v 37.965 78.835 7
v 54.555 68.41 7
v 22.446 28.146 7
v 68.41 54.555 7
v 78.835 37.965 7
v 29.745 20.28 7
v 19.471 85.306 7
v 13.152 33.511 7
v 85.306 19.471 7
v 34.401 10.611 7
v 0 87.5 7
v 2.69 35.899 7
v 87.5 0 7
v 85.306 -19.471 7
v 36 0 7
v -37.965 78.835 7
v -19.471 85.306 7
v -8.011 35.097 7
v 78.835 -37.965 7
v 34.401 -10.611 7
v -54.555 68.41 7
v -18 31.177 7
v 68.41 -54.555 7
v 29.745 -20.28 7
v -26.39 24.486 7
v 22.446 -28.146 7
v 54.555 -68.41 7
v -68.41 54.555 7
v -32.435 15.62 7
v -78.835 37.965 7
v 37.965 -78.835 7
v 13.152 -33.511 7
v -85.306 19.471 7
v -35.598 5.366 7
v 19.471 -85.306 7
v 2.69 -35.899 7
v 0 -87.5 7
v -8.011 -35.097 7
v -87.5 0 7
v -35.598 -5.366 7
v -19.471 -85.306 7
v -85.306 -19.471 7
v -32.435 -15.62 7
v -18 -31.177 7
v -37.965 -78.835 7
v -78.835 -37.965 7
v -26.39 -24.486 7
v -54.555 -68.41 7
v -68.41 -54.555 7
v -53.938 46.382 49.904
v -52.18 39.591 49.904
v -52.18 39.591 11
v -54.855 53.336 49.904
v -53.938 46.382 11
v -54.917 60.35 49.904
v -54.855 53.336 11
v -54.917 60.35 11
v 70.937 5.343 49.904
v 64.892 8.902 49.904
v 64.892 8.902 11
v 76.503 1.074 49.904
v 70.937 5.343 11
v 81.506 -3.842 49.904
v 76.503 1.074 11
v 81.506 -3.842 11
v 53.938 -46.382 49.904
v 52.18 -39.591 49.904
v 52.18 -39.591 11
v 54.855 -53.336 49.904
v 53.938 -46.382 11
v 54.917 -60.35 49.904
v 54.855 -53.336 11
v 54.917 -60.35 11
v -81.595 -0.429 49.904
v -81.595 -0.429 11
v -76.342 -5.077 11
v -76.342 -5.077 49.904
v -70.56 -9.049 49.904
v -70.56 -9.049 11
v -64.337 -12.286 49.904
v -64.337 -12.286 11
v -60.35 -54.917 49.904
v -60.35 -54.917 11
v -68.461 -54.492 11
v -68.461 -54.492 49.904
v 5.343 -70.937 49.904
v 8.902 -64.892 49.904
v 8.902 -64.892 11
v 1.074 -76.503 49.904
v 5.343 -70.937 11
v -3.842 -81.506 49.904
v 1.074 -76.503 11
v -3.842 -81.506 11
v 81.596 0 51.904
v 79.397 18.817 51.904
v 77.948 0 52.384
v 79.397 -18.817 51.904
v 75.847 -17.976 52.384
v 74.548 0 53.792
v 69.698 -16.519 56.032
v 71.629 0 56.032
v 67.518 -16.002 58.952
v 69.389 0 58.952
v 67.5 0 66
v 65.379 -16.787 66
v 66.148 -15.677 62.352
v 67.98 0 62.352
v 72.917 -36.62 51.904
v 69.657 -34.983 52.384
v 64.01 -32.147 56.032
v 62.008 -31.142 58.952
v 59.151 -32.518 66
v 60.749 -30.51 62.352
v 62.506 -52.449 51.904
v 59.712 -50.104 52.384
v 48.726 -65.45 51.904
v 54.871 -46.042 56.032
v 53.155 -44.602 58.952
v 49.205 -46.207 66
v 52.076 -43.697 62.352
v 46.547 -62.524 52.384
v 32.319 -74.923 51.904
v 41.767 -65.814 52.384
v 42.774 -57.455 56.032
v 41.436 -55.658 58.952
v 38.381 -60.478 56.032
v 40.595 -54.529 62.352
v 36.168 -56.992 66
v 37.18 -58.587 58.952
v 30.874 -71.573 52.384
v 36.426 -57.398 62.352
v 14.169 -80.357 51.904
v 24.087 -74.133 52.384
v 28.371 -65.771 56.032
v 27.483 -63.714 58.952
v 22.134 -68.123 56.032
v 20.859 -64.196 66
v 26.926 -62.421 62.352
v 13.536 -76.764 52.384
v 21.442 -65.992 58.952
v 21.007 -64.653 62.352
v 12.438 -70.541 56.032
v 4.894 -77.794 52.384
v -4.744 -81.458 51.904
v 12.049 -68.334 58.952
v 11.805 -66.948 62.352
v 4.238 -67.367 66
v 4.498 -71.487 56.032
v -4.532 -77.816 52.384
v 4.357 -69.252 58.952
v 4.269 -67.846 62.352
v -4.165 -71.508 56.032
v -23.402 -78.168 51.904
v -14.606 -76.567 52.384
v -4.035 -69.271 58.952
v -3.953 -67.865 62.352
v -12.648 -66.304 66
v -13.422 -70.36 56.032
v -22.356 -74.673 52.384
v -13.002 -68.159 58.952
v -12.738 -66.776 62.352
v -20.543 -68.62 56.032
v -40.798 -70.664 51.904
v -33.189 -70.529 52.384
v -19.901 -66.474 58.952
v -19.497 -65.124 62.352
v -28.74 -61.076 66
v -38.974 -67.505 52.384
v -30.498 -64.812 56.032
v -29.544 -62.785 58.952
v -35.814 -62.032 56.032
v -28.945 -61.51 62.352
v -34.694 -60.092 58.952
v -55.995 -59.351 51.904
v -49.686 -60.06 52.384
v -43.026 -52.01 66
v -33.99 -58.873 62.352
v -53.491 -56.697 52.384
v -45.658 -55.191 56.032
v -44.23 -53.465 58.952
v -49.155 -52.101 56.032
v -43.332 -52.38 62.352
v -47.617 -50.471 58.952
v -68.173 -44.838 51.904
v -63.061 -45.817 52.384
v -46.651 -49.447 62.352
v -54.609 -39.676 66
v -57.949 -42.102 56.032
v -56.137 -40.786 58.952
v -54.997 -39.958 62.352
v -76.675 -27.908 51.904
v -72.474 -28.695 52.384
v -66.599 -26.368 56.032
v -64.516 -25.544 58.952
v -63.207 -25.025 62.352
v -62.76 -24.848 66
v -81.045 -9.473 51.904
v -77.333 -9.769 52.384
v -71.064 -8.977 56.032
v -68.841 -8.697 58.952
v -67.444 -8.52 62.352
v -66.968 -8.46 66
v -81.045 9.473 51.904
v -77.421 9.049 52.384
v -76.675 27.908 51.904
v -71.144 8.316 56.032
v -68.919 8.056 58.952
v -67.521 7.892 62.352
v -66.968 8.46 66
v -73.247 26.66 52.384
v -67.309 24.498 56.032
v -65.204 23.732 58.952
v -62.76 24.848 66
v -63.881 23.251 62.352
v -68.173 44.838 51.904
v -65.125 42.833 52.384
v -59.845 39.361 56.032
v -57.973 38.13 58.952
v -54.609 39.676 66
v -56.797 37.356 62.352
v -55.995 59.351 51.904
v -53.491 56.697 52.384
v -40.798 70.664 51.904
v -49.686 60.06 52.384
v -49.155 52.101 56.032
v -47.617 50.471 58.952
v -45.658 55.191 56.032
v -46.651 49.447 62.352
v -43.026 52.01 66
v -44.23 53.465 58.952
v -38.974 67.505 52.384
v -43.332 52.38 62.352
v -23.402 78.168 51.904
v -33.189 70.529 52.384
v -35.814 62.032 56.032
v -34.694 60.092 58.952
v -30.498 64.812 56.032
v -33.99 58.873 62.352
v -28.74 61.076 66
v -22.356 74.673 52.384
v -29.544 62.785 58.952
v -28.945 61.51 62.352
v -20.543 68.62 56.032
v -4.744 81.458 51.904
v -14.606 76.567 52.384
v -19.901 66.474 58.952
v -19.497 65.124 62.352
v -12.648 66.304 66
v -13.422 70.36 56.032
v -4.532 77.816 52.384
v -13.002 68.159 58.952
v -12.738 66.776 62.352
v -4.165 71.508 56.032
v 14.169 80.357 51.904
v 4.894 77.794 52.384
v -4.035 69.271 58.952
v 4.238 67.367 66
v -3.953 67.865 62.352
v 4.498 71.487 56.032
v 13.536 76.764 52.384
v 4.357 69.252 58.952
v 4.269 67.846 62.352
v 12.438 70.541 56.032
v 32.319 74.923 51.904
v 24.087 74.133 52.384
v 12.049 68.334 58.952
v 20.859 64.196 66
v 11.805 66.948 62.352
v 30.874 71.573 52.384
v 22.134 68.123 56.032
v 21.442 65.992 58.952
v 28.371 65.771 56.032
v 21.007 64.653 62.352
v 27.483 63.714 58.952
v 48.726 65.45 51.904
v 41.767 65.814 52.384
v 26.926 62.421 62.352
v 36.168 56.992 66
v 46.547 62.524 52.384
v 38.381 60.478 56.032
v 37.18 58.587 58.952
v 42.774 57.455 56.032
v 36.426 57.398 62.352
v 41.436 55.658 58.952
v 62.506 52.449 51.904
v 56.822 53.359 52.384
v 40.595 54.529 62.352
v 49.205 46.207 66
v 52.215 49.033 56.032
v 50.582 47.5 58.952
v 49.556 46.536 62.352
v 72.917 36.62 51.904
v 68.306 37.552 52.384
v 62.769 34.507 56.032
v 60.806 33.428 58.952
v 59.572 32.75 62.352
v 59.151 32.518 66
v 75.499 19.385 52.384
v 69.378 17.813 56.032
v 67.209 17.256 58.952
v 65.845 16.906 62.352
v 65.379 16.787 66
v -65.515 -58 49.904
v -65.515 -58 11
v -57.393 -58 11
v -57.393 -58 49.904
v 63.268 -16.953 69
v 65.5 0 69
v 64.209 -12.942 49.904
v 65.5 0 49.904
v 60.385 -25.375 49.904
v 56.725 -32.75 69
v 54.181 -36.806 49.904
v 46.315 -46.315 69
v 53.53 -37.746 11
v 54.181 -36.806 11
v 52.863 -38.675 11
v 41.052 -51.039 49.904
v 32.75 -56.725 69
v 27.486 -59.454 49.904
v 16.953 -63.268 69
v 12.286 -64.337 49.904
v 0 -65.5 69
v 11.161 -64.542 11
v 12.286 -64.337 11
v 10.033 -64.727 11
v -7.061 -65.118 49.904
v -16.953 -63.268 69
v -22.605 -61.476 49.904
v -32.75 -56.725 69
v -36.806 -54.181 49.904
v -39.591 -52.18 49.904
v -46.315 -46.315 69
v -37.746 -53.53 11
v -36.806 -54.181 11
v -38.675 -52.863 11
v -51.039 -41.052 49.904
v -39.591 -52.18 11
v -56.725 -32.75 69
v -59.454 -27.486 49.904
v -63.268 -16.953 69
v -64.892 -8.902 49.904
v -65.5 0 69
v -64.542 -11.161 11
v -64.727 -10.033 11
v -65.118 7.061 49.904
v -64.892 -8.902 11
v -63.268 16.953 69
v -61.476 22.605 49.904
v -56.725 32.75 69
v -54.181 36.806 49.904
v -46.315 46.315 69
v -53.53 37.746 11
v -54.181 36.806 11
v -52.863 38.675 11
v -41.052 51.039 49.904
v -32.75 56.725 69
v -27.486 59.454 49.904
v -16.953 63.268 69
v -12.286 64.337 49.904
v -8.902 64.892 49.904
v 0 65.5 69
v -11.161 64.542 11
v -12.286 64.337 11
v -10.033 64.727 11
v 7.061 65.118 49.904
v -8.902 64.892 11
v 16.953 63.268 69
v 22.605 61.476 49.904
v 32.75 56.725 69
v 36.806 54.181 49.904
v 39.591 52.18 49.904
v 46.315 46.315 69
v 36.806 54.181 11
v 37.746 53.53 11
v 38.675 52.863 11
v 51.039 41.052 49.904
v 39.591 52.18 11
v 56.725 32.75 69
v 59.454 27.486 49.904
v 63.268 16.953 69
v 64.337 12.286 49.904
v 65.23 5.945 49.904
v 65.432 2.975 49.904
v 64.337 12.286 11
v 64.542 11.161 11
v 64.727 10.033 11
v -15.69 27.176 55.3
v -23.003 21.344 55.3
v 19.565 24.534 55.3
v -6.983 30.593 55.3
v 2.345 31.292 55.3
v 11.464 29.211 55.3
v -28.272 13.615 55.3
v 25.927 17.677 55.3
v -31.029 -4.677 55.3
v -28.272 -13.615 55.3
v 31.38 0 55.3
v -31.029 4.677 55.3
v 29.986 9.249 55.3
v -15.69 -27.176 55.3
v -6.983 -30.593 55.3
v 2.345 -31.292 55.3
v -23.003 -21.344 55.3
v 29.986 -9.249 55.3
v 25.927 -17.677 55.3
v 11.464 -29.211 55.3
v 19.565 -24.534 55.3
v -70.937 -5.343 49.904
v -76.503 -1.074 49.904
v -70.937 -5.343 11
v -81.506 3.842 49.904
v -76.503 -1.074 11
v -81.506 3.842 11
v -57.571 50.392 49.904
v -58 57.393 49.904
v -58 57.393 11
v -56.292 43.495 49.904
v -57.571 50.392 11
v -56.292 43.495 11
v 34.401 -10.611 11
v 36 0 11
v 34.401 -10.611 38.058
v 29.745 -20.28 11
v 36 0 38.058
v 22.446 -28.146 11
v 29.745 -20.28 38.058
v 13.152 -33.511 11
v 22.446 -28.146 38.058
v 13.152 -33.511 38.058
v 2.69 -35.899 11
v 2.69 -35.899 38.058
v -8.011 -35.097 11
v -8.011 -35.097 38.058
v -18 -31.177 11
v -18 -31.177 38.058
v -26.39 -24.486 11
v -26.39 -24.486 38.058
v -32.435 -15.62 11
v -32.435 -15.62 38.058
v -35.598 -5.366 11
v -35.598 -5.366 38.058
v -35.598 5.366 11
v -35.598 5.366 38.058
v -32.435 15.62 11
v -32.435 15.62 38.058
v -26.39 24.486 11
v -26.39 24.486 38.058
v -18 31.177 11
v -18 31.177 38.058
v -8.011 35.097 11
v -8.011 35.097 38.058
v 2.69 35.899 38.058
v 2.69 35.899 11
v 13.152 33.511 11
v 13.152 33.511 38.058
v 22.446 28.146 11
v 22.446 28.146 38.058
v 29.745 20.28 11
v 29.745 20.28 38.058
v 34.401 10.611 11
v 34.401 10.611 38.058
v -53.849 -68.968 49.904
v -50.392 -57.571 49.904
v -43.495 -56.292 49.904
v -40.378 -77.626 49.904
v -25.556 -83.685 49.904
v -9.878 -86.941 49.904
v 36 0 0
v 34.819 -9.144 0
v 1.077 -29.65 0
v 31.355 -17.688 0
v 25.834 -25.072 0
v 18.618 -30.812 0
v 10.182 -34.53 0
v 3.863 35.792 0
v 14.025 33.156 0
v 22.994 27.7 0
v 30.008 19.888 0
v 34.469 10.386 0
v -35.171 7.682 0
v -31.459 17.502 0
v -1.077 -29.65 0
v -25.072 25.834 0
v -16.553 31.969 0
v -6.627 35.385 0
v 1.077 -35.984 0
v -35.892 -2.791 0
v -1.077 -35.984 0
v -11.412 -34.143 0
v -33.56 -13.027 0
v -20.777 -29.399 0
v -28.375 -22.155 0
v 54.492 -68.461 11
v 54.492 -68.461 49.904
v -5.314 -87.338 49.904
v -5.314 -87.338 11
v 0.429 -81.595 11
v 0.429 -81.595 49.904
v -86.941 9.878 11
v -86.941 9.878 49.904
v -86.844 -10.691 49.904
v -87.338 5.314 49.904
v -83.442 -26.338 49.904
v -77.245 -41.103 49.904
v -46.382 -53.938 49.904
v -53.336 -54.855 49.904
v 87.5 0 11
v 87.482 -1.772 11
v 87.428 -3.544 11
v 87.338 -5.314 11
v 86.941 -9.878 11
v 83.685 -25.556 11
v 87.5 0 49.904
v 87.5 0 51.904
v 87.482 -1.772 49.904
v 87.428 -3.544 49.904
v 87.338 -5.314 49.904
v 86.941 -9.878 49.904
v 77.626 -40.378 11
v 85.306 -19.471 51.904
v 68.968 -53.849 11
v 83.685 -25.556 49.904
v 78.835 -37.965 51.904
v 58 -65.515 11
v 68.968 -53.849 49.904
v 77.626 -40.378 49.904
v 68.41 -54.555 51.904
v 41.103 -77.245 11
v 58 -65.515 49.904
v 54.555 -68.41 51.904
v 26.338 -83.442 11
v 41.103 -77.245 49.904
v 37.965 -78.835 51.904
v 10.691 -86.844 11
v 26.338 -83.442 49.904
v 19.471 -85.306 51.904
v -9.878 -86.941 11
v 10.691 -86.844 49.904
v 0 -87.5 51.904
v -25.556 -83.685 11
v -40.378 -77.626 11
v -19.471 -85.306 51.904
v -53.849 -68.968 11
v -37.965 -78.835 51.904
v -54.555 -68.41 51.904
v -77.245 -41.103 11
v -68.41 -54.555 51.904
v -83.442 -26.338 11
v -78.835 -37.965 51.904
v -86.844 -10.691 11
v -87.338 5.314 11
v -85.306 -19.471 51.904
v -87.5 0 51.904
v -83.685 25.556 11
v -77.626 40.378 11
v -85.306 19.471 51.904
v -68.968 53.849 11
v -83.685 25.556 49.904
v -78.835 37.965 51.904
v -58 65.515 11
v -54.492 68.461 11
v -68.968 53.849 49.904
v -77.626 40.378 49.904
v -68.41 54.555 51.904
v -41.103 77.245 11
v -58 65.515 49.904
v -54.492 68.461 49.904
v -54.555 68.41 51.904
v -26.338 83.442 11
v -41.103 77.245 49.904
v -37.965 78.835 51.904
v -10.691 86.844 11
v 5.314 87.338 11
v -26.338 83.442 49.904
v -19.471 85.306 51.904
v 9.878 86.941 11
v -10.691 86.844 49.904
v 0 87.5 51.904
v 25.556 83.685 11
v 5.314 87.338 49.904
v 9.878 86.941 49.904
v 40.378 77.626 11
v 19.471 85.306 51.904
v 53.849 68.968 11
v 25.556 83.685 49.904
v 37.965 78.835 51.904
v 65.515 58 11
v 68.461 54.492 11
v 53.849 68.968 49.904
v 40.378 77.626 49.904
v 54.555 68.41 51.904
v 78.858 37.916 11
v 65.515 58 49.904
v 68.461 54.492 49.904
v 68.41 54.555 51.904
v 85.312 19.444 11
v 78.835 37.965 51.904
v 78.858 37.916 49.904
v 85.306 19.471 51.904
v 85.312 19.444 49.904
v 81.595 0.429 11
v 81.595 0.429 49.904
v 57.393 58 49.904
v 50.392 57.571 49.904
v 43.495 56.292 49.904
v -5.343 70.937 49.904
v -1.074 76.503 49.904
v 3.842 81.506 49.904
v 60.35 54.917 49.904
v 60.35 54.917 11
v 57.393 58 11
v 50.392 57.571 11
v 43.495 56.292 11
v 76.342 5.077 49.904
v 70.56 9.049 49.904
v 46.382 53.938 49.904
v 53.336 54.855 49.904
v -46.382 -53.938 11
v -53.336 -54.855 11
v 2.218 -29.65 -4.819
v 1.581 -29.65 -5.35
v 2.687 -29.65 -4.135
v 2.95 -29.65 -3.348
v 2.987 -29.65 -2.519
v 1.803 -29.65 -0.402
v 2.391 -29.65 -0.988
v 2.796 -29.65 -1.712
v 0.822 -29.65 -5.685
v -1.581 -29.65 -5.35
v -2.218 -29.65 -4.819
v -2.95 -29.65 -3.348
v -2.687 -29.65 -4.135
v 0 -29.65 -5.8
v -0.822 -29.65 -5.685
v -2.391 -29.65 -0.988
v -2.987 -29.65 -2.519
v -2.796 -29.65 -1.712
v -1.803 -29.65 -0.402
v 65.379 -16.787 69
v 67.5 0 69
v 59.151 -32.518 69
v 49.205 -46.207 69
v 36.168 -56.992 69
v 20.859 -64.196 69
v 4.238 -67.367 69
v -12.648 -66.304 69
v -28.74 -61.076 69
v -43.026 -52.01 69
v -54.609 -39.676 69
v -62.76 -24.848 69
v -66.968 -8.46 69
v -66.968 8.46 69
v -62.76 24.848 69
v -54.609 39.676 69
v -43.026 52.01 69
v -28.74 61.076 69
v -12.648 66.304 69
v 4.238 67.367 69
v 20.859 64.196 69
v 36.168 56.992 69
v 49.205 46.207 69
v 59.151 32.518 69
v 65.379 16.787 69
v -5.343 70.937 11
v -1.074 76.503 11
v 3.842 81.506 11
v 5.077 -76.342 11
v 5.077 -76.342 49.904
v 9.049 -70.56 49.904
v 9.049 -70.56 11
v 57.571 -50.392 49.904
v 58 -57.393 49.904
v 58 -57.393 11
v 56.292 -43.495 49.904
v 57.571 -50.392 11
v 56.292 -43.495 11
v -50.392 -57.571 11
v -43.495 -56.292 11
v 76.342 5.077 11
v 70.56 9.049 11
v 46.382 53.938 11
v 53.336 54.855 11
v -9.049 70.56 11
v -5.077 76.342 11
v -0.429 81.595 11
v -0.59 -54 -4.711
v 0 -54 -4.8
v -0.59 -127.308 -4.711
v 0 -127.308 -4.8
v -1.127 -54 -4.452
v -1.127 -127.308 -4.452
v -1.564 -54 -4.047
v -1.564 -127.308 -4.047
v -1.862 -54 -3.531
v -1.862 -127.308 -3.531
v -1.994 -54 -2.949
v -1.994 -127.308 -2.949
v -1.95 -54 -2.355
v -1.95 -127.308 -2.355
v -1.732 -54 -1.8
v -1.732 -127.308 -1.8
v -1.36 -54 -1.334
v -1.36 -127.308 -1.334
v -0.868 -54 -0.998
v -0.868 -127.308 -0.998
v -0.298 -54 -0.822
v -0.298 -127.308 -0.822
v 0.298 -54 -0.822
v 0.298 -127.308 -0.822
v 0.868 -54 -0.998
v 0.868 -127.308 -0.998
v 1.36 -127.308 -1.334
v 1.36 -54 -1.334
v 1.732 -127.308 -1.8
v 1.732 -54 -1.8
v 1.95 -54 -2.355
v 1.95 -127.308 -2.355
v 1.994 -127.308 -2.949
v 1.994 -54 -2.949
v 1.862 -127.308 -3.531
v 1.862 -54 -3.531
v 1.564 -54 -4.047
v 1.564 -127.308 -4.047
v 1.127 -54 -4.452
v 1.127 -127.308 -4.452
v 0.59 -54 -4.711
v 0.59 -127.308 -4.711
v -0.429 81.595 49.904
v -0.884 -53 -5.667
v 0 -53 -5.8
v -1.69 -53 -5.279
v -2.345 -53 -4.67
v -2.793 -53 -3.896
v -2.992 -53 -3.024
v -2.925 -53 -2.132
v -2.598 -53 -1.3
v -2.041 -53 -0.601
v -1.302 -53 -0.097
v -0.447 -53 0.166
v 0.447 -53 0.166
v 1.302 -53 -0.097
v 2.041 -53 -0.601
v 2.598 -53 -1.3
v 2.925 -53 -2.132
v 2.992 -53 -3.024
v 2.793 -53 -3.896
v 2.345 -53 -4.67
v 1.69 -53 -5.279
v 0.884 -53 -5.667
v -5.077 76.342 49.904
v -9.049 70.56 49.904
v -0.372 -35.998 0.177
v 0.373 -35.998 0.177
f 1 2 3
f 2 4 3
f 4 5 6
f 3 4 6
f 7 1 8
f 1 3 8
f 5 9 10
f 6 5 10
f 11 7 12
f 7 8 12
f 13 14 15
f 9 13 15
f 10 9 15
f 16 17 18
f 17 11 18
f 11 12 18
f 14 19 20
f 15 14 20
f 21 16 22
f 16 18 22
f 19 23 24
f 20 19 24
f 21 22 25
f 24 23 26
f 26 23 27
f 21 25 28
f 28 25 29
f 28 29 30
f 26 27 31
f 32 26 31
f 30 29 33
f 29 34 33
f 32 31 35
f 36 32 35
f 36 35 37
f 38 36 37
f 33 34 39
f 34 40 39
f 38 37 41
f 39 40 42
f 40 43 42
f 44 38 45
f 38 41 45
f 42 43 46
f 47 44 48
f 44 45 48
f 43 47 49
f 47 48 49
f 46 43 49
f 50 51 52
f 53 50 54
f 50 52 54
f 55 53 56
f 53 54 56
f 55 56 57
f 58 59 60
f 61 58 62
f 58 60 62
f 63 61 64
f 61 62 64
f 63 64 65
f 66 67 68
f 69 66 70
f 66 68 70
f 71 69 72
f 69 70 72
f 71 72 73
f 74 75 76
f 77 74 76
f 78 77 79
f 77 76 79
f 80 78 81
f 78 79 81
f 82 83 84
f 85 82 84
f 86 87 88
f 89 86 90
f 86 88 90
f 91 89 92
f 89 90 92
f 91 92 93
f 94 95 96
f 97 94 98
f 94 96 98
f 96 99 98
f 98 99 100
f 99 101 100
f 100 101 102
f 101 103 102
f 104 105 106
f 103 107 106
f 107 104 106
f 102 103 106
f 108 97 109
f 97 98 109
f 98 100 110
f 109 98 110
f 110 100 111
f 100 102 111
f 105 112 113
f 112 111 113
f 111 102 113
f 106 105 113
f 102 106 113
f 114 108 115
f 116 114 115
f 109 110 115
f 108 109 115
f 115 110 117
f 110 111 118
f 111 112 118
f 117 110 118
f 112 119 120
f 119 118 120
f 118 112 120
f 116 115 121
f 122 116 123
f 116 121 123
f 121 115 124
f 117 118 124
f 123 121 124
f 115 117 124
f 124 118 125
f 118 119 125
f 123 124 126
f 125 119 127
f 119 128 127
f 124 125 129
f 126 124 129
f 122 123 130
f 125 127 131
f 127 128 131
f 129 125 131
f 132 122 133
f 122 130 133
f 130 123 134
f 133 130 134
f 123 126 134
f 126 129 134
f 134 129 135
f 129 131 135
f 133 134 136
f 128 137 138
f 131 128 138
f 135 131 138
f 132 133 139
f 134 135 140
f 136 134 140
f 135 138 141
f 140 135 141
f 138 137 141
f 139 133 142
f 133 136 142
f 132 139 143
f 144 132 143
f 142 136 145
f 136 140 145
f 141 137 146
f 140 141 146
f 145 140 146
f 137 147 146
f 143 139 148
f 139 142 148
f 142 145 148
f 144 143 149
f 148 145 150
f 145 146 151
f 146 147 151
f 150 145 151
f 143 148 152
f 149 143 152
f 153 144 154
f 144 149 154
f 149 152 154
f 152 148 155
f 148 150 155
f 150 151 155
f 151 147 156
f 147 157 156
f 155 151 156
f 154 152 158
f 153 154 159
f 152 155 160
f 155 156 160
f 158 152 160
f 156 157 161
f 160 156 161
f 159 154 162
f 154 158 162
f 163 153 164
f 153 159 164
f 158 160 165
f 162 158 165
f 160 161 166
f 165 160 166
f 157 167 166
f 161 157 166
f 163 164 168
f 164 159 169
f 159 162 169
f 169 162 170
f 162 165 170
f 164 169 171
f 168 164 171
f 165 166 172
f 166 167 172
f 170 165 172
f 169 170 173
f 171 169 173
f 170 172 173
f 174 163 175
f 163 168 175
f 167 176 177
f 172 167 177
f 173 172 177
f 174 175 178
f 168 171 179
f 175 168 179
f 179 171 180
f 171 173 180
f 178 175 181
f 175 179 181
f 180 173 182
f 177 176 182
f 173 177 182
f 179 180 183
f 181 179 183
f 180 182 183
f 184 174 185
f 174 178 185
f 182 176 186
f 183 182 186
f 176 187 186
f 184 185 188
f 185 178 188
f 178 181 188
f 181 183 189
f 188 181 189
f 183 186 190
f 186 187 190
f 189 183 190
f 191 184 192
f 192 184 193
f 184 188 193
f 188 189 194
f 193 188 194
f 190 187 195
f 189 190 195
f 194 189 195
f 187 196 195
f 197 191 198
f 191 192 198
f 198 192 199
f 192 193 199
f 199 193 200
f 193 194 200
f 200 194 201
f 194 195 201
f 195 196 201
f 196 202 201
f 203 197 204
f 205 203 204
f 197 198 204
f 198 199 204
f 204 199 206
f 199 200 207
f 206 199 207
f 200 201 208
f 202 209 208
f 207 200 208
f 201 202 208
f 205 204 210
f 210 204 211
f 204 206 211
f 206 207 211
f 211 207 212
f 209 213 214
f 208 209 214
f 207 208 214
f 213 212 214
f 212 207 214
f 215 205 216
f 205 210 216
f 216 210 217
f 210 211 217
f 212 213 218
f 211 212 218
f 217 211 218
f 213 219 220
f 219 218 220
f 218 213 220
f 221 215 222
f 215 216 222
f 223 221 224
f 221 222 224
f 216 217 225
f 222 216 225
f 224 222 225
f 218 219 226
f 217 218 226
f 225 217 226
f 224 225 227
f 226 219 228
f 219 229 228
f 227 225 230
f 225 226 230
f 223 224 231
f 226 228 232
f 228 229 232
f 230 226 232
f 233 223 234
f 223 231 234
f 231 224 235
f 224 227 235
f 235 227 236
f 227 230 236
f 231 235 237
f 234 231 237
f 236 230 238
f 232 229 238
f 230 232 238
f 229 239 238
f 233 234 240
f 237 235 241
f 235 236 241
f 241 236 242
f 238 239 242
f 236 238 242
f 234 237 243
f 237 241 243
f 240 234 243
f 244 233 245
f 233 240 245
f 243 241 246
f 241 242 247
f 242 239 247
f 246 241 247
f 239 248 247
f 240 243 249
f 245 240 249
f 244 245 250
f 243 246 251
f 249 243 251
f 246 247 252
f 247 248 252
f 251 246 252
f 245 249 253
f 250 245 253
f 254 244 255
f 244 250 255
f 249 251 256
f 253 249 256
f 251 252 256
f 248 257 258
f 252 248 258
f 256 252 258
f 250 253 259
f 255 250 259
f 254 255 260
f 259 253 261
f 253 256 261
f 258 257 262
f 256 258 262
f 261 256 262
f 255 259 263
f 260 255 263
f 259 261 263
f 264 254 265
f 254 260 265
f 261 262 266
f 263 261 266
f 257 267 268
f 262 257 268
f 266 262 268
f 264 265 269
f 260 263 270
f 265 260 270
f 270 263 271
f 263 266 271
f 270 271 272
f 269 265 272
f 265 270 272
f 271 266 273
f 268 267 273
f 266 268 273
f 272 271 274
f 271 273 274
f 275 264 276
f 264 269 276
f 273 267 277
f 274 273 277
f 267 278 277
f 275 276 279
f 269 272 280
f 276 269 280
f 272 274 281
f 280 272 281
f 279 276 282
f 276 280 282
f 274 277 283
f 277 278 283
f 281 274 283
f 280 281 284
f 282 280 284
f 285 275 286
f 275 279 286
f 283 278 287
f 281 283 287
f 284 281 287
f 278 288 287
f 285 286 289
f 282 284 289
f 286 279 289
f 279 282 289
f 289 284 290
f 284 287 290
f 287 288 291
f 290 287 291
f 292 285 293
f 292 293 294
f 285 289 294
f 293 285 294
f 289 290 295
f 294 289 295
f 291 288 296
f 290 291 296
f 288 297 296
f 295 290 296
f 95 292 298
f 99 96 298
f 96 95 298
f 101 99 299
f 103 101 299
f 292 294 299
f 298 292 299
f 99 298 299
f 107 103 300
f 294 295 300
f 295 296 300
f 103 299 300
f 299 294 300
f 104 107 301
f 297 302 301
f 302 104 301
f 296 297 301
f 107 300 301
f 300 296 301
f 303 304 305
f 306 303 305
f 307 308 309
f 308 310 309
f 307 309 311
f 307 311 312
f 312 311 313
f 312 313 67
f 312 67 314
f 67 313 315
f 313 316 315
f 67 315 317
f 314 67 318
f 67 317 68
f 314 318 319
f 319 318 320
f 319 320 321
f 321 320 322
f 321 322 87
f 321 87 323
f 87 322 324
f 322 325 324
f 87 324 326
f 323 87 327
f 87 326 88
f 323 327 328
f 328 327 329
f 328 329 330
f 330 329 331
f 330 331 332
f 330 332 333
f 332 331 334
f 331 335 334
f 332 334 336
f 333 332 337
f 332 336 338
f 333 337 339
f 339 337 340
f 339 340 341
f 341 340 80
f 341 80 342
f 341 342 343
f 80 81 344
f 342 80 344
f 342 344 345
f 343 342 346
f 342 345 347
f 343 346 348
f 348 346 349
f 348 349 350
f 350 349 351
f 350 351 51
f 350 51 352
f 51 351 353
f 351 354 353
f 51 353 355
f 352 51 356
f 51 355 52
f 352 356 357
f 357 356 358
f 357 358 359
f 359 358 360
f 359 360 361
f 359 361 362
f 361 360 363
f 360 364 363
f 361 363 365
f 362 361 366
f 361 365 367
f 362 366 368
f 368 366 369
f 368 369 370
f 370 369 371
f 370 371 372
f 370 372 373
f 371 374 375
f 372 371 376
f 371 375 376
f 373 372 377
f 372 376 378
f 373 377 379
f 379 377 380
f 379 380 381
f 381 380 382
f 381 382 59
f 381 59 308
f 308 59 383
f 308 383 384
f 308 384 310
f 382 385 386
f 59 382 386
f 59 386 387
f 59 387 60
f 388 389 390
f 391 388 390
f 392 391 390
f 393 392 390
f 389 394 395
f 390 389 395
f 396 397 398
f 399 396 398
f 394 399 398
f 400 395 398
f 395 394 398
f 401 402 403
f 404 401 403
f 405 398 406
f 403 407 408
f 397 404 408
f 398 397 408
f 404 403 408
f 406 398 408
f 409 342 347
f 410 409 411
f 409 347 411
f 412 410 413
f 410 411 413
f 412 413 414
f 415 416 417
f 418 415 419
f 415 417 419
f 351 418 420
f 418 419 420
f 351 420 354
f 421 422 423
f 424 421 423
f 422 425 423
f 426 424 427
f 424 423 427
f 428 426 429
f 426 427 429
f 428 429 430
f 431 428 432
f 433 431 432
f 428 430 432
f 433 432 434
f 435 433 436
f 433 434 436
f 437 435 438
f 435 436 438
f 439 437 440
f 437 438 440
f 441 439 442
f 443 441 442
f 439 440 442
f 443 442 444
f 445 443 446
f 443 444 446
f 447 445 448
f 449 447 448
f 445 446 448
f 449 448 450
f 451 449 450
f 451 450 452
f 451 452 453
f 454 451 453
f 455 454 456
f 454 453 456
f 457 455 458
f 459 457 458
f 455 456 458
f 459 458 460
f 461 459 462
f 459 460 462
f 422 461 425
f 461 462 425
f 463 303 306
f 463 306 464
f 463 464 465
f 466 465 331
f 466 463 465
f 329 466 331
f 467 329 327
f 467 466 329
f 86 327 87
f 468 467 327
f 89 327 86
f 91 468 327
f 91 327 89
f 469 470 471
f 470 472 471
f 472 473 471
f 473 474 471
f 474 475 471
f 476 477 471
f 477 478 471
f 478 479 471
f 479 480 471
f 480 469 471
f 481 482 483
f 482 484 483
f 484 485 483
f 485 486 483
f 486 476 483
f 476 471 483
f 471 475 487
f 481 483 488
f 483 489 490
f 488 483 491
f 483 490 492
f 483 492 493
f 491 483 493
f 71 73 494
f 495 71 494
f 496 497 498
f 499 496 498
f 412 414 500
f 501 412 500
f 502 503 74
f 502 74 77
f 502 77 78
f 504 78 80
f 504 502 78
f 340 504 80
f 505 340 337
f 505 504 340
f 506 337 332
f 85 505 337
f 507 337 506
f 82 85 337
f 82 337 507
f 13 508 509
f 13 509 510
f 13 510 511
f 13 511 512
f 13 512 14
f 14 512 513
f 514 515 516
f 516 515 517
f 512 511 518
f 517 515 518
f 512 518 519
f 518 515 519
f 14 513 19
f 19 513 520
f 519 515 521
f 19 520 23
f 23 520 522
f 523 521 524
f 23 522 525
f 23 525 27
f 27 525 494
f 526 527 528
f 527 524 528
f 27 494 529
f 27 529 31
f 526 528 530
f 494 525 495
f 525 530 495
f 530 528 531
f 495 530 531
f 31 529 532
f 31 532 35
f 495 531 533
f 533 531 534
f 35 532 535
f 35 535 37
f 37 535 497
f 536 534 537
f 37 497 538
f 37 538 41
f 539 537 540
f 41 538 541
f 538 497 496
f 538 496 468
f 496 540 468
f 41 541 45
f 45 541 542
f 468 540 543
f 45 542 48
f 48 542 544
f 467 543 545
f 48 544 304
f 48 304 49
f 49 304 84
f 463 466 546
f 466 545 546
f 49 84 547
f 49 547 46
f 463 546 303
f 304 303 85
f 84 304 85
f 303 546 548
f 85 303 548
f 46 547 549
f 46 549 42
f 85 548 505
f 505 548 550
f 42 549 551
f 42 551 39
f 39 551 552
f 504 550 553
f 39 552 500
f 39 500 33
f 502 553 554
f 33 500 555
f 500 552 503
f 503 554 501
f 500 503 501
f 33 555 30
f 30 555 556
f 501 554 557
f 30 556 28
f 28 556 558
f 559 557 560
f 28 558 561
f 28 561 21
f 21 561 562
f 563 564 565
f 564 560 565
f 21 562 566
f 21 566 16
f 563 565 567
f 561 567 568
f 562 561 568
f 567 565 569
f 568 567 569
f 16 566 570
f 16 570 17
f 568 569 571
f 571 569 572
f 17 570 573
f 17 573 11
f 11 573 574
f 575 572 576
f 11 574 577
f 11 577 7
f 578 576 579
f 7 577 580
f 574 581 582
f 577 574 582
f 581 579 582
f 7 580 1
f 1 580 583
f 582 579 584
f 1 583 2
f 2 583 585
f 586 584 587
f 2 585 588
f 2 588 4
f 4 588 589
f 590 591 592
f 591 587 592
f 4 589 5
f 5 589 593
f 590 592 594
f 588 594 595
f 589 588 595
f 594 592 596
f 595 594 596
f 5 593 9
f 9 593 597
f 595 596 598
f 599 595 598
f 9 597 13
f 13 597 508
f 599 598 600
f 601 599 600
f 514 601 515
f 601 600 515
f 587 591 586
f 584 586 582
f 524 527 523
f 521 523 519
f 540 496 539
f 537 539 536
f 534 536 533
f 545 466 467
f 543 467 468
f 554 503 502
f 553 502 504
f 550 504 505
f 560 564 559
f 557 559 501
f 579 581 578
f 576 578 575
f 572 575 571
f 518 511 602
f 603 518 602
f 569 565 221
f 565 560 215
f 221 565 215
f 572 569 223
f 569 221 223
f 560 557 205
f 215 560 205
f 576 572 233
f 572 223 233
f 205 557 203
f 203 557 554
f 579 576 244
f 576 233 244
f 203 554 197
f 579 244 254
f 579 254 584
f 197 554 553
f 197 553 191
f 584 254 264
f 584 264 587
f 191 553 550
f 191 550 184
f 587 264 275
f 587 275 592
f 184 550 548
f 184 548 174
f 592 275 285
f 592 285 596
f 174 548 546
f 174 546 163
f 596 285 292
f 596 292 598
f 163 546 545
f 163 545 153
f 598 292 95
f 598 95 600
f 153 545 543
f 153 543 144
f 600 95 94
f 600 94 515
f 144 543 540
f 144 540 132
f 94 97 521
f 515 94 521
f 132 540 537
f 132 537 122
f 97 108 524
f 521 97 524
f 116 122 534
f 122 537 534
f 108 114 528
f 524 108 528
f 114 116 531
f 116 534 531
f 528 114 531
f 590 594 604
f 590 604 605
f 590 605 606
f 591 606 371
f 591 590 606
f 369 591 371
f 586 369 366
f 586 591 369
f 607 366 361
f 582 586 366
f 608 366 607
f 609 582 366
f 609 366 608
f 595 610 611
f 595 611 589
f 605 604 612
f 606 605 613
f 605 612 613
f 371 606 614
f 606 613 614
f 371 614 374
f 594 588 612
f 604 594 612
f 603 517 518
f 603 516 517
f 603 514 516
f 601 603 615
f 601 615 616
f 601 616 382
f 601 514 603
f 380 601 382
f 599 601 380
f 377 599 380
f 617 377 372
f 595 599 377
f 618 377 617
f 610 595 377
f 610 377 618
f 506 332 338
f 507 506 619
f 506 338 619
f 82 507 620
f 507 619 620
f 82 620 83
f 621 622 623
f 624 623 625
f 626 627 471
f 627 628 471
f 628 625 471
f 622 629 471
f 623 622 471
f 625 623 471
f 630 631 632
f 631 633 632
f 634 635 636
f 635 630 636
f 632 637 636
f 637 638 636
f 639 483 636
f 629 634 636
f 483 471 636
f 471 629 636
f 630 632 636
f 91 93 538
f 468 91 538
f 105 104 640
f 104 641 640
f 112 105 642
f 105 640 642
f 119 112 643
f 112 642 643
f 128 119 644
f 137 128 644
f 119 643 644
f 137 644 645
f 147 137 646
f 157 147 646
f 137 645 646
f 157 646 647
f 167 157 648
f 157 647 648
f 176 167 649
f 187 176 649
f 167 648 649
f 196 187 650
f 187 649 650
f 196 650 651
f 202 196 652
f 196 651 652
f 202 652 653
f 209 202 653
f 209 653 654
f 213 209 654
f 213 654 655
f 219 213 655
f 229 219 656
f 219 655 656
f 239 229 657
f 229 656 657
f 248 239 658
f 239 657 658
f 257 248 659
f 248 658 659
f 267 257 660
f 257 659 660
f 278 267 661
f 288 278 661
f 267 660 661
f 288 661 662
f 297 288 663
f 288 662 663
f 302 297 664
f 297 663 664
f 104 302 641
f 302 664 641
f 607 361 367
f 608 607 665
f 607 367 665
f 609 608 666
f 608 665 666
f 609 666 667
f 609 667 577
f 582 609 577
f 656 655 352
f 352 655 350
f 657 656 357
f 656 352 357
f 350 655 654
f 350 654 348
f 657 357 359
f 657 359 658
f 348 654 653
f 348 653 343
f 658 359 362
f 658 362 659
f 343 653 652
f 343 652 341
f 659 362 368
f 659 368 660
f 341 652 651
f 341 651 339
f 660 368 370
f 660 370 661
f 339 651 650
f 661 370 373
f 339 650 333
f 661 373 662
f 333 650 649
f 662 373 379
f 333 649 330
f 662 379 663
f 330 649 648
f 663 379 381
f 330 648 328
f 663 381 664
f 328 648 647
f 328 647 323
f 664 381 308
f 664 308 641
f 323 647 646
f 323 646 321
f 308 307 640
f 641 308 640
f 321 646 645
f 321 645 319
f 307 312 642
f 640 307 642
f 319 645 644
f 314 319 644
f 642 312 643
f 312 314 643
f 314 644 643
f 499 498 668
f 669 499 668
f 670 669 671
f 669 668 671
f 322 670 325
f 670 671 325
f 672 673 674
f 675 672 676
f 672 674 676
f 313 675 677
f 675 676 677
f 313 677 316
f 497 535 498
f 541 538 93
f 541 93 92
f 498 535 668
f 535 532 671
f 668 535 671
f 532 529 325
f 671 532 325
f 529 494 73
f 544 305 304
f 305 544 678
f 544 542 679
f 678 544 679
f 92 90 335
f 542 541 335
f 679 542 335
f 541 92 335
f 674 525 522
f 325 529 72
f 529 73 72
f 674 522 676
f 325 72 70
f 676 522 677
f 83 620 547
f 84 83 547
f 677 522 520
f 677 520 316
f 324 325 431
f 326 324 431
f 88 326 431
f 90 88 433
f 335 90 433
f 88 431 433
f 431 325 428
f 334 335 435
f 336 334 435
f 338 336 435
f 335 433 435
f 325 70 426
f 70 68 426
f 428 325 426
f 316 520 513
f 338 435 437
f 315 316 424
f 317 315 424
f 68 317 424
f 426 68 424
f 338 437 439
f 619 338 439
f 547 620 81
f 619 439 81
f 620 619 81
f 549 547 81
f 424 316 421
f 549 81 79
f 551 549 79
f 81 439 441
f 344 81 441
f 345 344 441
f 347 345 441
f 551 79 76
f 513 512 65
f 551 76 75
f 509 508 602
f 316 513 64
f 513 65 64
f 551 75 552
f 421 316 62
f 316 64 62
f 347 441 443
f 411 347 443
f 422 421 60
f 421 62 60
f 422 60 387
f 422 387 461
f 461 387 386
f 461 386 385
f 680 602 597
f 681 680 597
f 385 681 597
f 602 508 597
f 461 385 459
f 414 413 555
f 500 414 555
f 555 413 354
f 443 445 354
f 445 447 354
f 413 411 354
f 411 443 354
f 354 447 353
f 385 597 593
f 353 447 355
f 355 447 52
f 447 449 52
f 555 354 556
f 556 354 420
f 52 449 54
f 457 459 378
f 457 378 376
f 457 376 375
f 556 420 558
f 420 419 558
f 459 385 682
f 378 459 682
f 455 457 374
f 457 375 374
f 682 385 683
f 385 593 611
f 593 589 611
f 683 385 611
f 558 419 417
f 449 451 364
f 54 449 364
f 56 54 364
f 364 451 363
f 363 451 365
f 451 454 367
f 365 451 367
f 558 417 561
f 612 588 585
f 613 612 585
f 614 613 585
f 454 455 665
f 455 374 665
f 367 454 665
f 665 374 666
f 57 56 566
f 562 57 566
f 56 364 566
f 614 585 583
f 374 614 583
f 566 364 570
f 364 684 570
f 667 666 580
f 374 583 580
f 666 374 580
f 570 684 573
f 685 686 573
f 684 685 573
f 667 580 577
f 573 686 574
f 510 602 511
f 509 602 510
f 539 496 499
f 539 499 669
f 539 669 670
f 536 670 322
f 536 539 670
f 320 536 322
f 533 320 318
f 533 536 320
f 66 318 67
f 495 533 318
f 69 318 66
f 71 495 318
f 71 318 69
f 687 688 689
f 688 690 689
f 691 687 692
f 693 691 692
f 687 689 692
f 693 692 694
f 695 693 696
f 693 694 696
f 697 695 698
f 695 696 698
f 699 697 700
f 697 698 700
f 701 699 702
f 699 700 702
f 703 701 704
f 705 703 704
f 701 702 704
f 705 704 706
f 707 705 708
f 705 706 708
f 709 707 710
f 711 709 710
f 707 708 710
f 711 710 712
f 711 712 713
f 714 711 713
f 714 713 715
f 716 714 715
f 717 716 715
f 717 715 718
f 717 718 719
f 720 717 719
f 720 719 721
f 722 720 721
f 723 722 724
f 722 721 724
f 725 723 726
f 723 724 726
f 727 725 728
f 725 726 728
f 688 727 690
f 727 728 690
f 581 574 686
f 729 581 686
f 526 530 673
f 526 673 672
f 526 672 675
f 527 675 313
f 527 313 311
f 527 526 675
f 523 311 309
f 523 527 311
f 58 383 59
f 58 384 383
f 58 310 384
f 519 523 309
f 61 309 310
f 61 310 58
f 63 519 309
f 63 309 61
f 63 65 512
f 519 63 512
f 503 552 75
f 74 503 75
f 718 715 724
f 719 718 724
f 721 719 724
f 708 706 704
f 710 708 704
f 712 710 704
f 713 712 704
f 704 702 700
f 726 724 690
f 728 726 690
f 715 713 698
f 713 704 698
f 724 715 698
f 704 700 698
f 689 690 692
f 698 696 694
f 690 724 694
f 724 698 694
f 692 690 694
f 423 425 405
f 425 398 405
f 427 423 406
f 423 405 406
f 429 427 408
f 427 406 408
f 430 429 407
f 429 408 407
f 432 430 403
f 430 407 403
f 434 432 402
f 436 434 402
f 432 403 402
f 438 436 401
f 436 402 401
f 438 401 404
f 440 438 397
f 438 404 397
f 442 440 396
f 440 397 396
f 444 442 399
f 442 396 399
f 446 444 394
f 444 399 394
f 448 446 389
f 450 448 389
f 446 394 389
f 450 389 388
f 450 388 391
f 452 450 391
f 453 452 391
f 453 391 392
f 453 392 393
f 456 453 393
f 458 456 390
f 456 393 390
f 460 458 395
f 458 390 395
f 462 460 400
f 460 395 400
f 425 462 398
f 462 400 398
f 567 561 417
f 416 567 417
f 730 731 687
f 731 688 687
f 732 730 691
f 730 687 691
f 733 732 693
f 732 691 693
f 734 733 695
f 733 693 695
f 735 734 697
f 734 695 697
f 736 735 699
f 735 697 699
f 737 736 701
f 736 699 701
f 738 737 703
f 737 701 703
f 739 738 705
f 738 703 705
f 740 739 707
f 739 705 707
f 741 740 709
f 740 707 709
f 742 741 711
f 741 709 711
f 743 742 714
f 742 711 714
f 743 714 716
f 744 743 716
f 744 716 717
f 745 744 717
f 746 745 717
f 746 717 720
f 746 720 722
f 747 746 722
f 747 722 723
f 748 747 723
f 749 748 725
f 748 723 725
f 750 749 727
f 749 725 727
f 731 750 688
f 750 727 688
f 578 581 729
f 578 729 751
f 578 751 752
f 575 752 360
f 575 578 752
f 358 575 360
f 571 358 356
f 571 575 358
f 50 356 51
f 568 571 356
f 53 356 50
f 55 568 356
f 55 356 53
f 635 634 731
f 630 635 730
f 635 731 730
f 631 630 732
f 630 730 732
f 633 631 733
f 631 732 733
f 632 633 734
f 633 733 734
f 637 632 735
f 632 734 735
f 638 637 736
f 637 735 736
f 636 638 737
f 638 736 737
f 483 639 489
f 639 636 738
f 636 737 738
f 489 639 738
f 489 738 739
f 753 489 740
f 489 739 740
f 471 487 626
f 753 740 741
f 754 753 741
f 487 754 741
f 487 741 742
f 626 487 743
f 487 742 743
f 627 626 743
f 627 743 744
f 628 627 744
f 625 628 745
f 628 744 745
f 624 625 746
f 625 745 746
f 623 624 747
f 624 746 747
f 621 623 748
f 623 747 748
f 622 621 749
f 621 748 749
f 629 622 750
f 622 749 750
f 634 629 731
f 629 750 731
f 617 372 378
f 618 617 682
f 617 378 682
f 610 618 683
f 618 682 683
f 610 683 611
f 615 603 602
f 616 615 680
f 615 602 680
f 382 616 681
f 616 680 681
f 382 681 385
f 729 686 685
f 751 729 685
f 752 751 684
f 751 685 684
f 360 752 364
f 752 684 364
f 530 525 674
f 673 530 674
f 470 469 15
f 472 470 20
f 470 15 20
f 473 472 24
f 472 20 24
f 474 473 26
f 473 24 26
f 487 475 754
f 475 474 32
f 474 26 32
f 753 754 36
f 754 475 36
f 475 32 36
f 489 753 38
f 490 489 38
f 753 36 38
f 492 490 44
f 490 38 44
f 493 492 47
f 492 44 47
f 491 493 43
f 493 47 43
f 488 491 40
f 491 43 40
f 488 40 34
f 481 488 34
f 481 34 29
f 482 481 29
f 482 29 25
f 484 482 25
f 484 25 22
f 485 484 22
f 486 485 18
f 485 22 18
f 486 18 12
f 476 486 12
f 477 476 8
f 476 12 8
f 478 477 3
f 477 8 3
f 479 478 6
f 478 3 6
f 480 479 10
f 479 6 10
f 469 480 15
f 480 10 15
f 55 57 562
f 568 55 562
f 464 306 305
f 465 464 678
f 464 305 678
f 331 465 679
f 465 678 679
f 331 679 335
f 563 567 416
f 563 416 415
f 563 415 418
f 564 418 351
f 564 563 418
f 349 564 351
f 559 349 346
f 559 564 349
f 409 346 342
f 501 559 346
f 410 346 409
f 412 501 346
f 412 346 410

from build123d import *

# Parameters (mm, degrees)
CUT_EXTRUDE1_DEPTH = 38.90367873
CIRPATTERN1_COUNT  = 8


with BuildPart() as part:
    # Sketch1 → Revolve1 (revolve)
    with BuildSketch(Plane(origin=(0, 0, 0), x_dir=(0, 0, -1), z_dir=(1, 0, 0)), mode=Mode.PRIVATE) as revolve1_sk:
        with BuildLine():
            Line((0, 0), (0, 36))
            Line((0, 36), (-7, 36))
            Line((-7, 36), (-7, 87.5))
            Line((-7, 87.5), (-51.90367873, 87.5))
            Line((-51.90367873, 87.5), (-51.90367873, 81.59632127))
            ThreePointArc((-51.90367873, 81.59632127), (-56.03239564, 71.62871691), (-66, 67.5))
            Line((-66, 67.5), (-69, 67.5))
            Line((-69, 67.5), (-69, 65.5))
            Line((-69, 65.5), (-11, 65.5))
            Line((-11, 65.5), (-11, 36))
            Line((-11, 36), (-38.057788399, 36))
            Line((-38.057788399, 36), (-55.3, 31.379963326))
            Line((-55.3, 31.379963326), (-55.3, 0))
            Line((-55.3, 0), (0, 0))
        make_face()
    revolve(revolve1_sk.sketch.rotate(Axis((0, 0, 0), (0, 0, -1)), 90), axis=Axis((0, 0, 0), (0, 0, -1)))

    # Sketch2 → Cut-Extrude1 (cut)
    with BuildSketch(Plane.XY.offset(11)):
        with BuildLine():
            Line((75.568573924, 58), (57.393027841, 58))
            ThreePointArc((57.393027841, 58), (32.84389058, 52.485045903), (13.012395116, 37))
            Line((13.012395116, 37), (-15.118999196, 37))
            ThreePointArc((-15.118999196, 37), (-10.556616441, 61.348122111), (3.84175649, 81.505831398))
            Line((3.84175649, 81.505831398), (17.348819511, 93.667645569))
            Line((17.348819511, 93.667645569), (75.568573924, 58))
        make_face()
    cut_extrude1 = extrude(amount=CUT_EXTRUDE1_DEPTH, mode=Mode.SUBTRACT)

    # CirPattern1: Cut-Extrude1 ×8 about axis
    cirpattern1_axis = Axis((0, 0, 0), (0, 0, 1))
    for i in range(1, CIRPATTERN1_COUNT):
        add(cut_extrude1.rotate(cirpattern1_axis, i * 360 / CIRPATTERN1_COUNT), mode=Mode.SUBTRACT)

    # Sketch3 → Revolve2 (revolve)
    with BuildSketch(Plane(origin=(0, 0, 0), x_dir=(0, 0, -1), z_dir=(1, 0, 0))):
        Polygon((5.8, -29.649658317), (5.8, -53), (4.8, -54), (4.8, -127.307937006), (2.8, -127.307937006), (2.8, -29.649658317), align=None)
    revolve(axis=Axis((0, -29.649658317, -2.8), (0, 1, 0)))


solid = part.part
